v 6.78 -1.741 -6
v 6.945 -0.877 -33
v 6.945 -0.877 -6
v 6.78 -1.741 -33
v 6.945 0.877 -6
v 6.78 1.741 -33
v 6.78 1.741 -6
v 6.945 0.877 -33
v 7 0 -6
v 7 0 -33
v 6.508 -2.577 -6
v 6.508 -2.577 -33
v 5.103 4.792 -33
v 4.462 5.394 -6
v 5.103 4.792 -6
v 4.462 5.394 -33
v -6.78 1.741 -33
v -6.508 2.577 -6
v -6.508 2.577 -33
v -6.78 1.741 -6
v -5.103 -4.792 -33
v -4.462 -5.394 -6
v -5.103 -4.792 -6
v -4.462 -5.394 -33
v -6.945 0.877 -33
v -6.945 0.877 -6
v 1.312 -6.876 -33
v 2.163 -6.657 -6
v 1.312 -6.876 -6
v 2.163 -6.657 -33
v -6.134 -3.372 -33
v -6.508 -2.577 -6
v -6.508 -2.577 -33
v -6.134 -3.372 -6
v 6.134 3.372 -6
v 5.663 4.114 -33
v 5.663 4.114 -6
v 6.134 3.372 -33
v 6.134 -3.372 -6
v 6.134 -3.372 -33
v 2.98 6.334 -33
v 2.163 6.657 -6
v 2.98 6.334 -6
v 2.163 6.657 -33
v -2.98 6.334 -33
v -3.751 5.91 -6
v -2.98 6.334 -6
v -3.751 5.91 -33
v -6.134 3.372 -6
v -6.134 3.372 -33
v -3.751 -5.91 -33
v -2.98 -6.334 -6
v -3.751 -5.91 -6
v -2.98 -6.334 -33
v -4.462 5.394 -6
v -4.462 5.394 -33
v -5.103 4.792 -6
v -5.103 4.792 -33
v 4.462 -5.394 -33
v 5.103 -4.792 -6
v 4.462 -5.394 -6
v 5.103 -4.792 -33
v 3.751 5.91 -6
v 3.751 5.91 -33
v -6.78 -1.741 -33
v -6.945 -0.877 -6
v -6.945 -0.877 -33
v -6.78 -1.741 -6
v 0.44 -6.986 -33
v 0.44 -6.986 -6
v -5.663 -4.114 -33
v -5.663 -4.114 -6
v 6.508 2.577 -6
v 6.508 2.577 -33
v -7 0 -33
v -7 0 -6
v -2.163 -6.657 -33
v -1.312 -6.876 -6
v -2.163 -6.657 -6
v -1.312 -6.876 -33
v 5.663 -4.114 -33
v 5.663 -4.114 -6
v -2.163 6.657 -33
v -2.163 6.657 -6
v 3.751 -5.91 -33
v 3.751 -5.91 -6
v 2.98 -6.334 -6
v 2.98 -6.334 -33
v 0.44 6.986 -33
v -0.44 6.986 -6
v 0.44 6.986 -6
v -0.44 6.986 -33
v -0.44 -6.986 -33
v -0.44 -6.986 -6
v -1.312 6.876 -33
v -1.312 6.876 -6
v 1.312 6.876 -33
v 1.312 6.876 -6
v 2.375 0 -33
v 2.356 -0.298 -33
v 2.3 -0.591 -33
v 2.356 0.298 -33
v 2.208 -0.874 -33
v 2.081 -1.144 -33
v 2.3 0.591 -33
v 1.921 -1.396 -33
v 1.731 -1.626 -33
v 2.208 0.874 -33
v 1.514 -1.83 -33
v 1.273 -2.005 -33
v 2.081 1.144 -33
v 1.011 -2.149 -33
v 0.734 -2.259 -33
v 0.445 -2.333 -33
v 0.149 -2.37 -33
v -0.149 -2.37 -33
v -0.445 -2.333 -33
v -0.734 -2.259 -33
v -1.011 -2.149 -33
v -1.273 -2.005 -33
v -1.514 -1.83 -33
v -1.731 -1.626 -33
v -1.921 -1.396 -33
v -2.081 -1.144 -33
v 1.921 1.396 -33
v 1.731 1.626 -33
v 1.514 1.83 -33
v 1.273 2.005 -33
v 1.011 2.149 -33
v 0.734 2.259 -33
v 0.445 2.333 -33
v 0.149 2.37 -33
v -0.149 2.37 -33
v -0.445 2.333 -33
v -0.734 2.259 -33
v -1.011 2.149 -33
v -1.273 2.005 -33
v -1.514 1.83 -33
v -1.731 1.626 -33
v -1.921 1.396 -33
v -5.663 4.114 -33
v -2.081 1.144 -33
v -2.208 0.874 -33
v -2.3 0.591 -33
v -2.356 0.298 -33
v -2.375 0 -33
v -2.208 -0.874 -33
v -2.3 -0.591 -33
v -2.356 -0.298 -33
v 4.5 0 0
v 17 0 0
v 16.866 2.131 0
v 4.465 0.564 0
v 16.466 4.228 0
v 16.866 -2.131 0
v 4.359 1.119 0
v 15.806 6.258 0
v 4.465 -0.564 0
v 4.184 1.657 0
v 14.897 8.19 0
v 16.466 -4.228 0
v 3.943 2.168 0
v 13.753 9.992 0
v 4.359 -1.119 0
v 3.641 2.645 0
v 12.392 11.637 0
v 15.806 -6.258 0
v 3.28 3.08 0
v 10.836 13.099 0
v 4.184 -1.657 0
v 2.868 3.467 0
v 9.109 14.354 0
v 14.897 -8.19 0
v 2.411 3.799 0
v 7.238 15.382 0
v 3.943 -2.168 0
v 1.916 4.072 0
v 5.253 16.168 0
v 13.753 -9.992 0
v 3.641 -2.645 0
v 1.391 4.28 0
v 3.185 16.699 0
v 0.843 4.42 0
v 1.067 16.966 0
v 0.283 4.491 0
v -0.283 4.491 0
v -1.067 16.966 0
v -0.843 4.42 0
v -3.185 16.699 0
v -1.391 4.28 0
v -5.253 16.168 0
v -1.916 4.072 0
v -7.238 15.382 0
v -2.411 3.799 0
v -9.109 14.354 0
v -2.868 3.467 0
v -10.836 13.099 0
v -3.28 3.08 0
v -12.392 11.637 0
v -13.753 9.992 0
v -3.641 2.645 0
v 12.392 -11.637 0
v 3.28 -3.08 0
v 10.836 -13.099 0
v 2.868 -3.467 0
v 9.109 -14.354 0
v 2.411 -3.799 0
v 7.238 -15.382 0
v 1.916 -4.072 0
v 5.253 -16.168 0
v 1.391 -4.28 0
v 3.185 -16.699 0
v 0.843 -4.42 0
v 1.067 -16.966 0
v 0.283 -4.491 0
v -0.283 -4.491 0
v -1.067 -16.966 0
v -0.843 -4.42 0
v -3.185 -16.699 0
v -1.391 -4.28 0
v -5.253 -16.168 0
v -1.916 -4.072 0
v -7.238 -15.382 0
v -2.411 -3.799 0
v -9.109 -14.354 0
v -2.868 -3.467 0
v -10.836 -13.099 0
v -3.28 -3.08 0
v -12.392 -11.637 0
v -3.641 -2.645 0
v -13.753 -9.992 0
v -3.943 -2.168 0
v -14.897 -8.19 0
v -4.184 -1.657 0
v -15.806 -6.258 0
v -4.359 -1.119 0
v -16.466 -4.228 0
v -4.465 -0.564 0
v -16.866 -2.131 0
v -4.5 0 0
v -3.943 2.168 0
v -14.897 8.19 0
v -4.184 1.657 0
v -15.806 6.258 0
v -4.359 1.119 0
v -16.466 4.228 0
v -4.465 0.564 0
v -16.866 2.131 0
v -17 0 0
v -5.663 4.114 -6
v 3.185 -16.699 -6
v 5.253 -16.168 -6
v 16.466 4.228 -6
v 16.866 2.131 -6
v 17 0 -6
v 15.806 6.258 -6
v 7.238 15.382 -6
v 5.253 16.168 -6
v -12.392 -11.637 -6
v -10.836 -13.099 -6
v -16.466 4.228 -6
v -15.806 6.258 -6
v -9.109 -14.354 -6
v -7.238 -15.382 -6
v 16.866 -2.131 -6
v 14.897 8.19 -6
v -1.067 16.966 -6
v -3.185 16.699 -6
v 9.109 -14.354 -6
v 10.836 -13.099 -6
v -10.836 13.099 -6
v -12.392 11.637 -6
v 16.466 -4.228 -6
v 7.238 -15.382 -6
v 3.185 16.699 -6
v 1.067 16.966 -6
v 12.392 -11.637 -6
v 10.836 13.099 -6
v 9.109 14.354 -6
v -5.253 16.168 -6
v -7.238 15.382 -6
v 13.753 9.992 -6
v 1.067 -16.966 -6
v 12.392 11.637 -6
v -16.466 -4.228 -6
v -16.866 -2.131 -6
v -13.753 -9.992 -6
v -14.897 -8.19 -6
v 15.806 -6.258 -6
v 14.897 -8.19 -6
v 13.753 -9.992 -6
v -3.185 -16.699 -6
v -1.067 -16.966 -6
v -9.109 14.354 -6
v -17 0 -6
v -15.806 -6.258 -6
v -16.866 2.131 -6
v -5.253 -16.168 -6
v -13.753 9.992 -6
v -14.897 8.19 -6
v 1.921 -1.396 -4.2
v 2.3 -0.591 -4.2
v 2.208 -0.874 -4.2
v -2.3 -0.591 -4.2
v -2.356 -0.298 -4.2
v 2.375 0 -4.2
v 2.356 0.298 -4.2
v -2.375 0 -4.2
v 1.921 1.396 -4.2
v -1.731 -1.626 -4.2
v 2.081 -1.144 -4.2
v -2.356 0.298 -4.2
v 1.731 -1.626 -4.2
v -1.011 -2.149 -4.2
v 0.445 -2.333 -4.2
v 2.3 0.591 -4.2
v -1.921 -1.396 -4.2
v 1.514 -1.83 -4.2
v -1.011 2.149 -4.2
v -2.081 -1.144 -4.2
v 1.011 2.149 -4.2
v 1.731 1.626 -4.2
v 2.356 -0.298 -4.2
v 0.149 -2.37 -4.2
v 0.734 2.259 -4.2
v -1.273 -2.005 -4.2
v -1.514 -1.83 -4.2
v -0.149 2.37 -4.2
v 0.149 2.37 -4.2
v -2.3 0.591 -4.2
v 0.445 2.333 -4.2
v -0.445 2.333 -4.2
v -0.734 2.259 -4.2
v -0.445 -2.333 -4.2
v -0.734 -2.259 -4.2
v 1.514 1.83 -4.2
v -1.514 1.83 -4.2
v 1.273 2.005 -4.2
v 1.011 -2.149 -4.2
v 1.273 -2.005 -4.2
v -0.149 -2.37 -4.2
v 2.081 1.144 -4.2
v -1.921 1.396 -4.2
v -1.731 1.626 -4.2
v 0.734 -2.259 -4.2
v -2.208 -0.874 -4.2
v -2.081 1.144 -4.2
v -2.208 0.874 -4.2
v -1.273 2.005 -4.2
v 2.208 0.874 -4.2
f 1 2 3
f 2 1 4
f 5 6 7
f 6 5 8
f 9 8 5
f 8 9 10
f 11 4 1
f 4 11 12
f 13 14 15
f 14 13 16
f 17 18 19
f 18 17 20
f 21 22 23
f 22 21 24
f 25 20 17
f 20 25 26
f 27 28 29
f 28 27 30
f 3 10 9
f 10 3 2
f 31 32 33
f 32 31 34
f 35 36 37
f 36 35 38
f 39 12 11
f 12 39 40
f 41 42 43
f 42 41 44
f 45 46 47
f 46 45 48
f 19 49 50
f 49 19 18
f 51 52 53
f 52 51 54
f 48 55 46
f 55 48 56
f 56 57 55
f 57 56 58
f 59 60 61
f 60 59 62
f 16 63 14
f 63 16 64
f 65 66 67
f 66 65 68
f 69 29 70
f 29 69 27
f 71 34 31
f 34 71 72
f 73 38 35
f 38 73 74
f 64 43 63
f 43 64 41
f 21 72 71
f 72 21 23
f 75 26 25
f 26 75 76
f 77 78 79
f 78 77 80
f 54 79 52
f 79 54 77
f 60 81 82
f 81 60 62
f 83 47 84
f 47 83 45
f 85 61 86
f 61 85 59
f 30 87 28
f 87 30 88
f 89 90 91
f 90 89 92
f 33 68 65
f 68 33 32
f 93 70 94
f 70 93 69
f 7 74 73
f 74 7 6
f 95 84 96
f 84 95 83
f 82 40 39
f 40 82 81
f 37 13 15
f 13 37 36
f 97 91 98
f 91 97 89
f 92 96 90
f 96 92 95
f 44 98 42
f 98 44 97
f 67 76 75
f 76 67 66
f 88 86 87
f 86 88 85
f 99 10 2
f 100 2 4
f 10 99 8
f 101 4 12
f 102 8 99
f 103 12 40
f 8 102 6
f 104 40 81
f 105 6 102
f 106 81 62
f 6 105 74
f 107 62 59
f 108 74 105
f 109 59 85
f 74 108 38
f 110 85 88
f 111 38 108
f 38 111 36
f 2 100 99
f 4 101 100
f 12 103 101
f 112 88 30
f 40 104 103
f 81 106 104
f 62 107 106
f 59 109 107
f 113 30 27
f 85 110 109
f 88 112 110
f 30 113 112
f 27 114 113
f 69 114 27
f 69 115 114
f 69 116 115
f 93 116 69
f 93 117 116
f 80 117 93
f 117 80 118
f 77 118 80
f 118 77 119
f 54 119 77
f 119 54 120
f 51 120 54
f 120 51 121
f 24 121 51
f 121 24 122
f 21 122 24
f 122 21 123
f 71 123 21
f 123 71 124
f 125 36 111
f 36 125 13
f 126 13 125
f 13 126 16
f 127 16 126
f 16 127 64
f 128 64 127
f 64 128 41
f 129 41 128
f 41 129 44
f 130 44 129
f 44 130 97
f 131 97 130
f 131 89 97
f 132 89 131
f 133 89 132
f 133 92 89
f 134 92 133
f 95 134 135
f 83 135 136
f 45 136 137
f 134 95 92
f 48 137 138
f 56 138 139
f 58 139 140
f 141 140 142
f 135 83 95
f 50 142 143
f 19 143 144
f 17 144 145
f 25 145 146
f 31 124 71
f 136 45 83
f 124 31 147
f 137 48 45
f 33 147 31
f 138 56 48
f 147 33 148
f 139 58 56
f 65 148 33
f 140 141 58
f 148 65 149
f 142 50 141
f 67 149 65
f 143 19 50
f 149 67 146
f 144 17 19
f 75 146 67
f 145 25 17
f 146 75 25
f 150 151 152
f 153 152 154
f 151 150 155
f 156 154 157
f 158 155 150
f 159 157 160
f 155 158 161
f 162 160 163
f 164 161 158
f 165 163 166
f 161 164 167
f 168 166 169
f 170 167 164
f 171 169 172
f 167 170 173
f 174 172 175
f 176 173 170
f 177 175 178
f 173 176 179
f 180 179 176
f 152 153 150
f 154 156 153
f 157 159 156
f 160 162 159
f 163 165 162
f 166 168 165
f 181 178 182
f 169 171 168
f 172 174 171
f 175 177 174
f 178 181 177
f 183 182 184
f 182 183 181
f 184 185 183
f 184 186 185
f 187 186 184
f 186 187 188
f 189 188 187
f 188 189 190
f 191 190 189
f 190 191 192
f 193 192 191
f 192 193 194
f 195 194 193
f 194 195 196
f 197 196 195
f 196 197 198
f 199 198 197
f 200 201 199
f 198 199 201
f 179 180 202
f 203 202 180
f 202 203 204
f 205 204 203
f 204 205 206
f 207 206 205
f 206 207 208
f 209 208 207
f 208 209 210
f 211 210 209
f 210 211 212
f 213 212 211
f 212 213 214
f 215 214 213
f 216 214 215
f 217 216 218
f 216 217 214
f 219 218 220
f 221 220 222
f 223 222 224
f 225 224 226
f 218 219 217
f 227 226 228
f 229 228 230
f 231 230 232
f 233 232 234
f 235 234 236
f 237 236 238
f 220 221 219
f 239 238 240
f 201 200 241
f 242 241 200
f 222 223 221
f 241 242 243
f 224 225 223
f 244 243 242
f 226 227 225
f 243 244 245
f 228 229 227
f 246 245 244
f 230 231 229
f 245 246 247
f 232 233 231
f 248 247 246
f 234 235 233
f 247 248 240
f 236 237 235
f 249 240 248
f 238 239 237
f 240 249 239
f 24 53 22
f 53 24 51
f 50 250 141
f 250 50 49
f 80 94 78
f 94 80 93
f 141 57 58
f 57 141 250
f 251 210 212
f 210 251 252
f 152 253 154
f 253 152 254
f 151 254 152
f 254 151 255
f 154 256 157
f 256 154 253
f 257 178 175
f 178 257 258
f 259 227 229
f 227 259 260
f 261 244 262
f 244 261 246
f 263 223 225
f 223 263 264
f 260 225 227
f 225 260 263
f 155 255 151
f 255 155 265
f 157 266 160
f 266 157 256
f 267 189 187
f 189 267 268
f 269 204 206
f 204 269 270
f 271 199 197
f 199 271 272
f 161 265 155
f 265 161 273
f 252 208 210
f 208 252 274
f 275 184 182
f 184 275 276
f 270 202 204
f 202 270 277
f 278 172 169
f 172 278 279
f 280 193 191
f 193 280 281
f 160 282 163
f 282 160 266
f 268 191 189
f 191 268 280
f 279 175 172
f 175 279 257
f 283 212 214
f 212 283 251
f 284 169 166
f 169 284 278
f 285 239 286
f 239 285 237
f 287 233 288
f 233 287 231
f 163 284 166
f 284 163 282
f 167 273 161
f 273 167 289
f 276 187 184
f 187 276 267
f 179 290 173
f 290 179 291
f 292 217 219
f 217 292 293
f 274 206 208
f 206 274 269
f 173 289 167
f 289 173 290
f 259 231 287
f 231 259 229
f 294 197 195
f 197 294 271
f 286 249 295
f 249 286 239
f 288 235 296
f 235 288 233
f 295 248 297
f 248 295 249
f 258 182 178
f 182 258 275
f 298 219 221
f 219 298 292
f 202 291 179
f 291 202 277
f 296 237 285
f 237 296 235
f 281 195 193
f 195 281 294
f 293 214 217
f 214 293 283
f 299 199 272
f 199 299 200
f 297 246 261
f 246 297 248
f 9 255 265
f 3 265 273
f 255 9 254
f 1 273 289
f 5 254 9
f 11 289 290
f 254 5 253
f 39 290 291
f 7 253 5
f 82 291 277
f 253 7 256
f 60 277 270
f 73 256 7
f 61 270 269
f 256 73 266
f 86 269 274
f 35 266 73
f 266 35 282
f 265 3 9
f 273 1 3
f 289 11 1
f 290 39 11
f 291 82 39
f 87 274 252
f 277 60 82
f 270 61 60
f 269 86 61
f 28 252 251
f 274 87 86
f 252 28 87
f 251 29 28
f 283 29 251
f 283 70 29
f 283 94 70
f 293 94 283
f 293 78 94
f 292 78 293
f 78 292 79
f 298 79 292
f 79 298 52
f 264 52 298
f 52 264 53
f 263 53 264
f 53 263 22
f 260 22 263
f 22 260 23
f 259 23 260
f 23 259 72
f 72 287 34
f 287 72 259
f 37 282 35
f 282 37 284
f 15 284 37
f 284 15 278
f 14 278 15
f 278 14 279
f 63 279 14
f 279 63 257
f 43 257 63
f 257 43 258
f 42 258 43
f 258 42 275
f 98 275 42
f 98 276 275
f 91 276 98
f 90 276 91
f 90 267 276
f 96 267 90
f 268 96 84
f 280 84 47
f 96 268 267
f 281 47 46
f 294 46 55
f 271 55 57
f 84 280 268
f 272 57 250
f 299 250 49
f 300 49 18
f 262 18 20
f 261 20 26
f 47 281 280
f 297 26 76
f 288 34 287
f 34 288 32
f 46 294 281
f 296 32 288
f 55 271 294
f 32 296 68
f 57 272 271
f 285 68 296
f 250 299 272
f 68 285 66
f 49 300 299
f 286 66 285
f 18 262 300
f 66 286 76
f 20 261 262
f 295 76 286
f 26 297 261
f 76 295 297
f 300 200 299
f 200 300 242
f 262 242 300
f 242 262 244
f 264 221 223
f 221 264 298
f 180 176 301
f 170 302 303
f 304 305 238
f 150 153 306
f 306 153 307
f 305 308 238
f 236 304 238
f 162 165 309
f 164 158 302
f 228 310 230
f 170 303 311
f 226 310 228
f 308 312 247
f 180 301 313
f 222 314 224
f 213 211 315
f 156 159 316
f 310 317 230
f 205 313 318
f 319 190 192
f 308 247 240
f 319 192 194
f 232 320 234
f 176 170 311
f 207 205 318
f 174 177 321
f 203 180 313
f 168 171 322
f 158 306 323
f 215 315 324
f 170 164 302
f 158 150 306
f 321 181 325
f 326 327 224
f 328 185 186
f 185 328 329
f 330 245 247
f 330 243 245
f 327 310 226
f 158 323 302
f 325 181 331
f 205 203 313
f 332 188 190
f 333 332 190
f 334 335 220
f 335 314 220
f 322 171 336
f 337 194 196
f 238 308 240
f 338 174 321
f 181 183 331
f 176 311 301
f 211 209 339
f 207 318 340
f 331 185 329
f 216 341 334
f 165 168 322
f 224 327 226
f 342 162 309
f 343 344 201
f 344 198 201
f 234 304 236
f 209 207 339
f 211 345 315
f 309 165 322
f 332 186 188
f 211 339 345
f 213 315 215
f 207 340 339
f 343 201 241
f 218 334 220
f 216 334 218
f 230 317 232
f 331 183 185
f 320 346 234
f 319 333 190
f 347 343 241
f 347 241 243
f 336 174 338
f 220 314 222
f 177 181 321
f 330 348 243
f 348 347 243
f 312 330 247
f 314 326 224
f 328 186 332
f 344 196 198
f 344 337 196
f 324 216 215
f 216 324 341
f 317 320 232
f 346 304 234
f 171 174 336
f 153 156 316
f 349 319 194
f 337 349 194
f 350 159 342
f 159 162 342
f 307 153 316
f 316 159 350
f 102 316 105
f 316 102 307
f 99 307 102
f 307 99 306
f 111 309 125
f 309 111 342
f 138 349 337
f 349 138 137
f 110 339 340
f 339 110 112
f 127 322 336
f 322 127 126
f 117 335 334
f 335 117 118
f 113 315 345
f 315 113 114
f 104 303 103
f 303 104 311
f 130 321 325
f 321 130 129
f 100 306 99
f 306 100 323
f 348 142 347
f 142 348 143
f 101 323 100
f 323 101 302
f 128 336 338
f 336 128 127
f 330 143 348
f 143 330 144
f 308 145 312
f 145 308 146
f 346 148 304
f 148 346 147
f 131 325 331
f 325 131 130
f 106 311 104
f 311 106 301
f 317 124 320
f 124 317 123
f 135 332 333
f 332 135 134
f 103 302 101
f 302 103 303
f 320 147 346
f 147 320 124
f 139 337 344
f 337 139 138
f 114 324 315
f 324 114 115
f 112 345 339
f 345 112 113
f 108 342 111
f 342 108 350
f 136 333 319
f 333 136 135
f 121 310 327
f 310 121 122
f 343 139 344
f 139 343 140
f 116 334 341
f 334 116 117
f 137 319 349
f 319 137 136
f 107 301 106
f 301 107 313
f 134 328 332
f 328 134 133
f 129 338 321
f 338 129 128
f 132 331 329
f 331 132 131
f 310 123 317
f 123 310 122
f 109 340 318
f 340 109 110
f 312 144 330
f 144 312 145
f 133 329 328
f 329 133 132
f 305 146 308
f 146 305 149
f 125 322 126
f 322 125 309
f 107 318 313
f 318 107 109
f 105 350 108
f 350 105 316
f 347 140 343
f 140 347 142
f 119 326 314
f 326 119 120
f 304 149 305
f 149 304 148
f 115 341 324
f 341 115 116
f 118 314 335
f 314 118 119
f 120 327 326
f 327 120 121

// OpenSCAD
$fn = 50;


difference() {
	union() {
		translate(v = [0, 0, -33.0000000000]) {
			cylinder(h = 33, r = 7.0000000000);
		}
		translate(v = [0, 0, -6.0000000000]) {
			cylinder(h = 6, r = 17.0000000000);
		}
	}
	union() {
		translate(v = [0, 0, 0]) {
			rotate(a = [0, 0, 0]) {
				difference() {
					union() {
						#translate(v = [0, 0, -33.0000000000]) {
							cylinder(h = 33, r = 2.2500000000);
						}
						#translate(v = [0, 0, -4.2000000000]) {
							cylinder(h = 4.2000000000, r = 7.0000000000, r1 = 2.3750000000, r2 = 4.5000000000);
						}
						#translate(v = [0, 0, -33.0000000000]) {
							cylinder(h = 33, r = 2.3750000000);
						}
						#translate(v = [0, 0, -33.0000000000]) {
							cylinder(h = 33, r = 2.2500000000);
						}
					}
					union();
				}
			}
		}
	}
}
